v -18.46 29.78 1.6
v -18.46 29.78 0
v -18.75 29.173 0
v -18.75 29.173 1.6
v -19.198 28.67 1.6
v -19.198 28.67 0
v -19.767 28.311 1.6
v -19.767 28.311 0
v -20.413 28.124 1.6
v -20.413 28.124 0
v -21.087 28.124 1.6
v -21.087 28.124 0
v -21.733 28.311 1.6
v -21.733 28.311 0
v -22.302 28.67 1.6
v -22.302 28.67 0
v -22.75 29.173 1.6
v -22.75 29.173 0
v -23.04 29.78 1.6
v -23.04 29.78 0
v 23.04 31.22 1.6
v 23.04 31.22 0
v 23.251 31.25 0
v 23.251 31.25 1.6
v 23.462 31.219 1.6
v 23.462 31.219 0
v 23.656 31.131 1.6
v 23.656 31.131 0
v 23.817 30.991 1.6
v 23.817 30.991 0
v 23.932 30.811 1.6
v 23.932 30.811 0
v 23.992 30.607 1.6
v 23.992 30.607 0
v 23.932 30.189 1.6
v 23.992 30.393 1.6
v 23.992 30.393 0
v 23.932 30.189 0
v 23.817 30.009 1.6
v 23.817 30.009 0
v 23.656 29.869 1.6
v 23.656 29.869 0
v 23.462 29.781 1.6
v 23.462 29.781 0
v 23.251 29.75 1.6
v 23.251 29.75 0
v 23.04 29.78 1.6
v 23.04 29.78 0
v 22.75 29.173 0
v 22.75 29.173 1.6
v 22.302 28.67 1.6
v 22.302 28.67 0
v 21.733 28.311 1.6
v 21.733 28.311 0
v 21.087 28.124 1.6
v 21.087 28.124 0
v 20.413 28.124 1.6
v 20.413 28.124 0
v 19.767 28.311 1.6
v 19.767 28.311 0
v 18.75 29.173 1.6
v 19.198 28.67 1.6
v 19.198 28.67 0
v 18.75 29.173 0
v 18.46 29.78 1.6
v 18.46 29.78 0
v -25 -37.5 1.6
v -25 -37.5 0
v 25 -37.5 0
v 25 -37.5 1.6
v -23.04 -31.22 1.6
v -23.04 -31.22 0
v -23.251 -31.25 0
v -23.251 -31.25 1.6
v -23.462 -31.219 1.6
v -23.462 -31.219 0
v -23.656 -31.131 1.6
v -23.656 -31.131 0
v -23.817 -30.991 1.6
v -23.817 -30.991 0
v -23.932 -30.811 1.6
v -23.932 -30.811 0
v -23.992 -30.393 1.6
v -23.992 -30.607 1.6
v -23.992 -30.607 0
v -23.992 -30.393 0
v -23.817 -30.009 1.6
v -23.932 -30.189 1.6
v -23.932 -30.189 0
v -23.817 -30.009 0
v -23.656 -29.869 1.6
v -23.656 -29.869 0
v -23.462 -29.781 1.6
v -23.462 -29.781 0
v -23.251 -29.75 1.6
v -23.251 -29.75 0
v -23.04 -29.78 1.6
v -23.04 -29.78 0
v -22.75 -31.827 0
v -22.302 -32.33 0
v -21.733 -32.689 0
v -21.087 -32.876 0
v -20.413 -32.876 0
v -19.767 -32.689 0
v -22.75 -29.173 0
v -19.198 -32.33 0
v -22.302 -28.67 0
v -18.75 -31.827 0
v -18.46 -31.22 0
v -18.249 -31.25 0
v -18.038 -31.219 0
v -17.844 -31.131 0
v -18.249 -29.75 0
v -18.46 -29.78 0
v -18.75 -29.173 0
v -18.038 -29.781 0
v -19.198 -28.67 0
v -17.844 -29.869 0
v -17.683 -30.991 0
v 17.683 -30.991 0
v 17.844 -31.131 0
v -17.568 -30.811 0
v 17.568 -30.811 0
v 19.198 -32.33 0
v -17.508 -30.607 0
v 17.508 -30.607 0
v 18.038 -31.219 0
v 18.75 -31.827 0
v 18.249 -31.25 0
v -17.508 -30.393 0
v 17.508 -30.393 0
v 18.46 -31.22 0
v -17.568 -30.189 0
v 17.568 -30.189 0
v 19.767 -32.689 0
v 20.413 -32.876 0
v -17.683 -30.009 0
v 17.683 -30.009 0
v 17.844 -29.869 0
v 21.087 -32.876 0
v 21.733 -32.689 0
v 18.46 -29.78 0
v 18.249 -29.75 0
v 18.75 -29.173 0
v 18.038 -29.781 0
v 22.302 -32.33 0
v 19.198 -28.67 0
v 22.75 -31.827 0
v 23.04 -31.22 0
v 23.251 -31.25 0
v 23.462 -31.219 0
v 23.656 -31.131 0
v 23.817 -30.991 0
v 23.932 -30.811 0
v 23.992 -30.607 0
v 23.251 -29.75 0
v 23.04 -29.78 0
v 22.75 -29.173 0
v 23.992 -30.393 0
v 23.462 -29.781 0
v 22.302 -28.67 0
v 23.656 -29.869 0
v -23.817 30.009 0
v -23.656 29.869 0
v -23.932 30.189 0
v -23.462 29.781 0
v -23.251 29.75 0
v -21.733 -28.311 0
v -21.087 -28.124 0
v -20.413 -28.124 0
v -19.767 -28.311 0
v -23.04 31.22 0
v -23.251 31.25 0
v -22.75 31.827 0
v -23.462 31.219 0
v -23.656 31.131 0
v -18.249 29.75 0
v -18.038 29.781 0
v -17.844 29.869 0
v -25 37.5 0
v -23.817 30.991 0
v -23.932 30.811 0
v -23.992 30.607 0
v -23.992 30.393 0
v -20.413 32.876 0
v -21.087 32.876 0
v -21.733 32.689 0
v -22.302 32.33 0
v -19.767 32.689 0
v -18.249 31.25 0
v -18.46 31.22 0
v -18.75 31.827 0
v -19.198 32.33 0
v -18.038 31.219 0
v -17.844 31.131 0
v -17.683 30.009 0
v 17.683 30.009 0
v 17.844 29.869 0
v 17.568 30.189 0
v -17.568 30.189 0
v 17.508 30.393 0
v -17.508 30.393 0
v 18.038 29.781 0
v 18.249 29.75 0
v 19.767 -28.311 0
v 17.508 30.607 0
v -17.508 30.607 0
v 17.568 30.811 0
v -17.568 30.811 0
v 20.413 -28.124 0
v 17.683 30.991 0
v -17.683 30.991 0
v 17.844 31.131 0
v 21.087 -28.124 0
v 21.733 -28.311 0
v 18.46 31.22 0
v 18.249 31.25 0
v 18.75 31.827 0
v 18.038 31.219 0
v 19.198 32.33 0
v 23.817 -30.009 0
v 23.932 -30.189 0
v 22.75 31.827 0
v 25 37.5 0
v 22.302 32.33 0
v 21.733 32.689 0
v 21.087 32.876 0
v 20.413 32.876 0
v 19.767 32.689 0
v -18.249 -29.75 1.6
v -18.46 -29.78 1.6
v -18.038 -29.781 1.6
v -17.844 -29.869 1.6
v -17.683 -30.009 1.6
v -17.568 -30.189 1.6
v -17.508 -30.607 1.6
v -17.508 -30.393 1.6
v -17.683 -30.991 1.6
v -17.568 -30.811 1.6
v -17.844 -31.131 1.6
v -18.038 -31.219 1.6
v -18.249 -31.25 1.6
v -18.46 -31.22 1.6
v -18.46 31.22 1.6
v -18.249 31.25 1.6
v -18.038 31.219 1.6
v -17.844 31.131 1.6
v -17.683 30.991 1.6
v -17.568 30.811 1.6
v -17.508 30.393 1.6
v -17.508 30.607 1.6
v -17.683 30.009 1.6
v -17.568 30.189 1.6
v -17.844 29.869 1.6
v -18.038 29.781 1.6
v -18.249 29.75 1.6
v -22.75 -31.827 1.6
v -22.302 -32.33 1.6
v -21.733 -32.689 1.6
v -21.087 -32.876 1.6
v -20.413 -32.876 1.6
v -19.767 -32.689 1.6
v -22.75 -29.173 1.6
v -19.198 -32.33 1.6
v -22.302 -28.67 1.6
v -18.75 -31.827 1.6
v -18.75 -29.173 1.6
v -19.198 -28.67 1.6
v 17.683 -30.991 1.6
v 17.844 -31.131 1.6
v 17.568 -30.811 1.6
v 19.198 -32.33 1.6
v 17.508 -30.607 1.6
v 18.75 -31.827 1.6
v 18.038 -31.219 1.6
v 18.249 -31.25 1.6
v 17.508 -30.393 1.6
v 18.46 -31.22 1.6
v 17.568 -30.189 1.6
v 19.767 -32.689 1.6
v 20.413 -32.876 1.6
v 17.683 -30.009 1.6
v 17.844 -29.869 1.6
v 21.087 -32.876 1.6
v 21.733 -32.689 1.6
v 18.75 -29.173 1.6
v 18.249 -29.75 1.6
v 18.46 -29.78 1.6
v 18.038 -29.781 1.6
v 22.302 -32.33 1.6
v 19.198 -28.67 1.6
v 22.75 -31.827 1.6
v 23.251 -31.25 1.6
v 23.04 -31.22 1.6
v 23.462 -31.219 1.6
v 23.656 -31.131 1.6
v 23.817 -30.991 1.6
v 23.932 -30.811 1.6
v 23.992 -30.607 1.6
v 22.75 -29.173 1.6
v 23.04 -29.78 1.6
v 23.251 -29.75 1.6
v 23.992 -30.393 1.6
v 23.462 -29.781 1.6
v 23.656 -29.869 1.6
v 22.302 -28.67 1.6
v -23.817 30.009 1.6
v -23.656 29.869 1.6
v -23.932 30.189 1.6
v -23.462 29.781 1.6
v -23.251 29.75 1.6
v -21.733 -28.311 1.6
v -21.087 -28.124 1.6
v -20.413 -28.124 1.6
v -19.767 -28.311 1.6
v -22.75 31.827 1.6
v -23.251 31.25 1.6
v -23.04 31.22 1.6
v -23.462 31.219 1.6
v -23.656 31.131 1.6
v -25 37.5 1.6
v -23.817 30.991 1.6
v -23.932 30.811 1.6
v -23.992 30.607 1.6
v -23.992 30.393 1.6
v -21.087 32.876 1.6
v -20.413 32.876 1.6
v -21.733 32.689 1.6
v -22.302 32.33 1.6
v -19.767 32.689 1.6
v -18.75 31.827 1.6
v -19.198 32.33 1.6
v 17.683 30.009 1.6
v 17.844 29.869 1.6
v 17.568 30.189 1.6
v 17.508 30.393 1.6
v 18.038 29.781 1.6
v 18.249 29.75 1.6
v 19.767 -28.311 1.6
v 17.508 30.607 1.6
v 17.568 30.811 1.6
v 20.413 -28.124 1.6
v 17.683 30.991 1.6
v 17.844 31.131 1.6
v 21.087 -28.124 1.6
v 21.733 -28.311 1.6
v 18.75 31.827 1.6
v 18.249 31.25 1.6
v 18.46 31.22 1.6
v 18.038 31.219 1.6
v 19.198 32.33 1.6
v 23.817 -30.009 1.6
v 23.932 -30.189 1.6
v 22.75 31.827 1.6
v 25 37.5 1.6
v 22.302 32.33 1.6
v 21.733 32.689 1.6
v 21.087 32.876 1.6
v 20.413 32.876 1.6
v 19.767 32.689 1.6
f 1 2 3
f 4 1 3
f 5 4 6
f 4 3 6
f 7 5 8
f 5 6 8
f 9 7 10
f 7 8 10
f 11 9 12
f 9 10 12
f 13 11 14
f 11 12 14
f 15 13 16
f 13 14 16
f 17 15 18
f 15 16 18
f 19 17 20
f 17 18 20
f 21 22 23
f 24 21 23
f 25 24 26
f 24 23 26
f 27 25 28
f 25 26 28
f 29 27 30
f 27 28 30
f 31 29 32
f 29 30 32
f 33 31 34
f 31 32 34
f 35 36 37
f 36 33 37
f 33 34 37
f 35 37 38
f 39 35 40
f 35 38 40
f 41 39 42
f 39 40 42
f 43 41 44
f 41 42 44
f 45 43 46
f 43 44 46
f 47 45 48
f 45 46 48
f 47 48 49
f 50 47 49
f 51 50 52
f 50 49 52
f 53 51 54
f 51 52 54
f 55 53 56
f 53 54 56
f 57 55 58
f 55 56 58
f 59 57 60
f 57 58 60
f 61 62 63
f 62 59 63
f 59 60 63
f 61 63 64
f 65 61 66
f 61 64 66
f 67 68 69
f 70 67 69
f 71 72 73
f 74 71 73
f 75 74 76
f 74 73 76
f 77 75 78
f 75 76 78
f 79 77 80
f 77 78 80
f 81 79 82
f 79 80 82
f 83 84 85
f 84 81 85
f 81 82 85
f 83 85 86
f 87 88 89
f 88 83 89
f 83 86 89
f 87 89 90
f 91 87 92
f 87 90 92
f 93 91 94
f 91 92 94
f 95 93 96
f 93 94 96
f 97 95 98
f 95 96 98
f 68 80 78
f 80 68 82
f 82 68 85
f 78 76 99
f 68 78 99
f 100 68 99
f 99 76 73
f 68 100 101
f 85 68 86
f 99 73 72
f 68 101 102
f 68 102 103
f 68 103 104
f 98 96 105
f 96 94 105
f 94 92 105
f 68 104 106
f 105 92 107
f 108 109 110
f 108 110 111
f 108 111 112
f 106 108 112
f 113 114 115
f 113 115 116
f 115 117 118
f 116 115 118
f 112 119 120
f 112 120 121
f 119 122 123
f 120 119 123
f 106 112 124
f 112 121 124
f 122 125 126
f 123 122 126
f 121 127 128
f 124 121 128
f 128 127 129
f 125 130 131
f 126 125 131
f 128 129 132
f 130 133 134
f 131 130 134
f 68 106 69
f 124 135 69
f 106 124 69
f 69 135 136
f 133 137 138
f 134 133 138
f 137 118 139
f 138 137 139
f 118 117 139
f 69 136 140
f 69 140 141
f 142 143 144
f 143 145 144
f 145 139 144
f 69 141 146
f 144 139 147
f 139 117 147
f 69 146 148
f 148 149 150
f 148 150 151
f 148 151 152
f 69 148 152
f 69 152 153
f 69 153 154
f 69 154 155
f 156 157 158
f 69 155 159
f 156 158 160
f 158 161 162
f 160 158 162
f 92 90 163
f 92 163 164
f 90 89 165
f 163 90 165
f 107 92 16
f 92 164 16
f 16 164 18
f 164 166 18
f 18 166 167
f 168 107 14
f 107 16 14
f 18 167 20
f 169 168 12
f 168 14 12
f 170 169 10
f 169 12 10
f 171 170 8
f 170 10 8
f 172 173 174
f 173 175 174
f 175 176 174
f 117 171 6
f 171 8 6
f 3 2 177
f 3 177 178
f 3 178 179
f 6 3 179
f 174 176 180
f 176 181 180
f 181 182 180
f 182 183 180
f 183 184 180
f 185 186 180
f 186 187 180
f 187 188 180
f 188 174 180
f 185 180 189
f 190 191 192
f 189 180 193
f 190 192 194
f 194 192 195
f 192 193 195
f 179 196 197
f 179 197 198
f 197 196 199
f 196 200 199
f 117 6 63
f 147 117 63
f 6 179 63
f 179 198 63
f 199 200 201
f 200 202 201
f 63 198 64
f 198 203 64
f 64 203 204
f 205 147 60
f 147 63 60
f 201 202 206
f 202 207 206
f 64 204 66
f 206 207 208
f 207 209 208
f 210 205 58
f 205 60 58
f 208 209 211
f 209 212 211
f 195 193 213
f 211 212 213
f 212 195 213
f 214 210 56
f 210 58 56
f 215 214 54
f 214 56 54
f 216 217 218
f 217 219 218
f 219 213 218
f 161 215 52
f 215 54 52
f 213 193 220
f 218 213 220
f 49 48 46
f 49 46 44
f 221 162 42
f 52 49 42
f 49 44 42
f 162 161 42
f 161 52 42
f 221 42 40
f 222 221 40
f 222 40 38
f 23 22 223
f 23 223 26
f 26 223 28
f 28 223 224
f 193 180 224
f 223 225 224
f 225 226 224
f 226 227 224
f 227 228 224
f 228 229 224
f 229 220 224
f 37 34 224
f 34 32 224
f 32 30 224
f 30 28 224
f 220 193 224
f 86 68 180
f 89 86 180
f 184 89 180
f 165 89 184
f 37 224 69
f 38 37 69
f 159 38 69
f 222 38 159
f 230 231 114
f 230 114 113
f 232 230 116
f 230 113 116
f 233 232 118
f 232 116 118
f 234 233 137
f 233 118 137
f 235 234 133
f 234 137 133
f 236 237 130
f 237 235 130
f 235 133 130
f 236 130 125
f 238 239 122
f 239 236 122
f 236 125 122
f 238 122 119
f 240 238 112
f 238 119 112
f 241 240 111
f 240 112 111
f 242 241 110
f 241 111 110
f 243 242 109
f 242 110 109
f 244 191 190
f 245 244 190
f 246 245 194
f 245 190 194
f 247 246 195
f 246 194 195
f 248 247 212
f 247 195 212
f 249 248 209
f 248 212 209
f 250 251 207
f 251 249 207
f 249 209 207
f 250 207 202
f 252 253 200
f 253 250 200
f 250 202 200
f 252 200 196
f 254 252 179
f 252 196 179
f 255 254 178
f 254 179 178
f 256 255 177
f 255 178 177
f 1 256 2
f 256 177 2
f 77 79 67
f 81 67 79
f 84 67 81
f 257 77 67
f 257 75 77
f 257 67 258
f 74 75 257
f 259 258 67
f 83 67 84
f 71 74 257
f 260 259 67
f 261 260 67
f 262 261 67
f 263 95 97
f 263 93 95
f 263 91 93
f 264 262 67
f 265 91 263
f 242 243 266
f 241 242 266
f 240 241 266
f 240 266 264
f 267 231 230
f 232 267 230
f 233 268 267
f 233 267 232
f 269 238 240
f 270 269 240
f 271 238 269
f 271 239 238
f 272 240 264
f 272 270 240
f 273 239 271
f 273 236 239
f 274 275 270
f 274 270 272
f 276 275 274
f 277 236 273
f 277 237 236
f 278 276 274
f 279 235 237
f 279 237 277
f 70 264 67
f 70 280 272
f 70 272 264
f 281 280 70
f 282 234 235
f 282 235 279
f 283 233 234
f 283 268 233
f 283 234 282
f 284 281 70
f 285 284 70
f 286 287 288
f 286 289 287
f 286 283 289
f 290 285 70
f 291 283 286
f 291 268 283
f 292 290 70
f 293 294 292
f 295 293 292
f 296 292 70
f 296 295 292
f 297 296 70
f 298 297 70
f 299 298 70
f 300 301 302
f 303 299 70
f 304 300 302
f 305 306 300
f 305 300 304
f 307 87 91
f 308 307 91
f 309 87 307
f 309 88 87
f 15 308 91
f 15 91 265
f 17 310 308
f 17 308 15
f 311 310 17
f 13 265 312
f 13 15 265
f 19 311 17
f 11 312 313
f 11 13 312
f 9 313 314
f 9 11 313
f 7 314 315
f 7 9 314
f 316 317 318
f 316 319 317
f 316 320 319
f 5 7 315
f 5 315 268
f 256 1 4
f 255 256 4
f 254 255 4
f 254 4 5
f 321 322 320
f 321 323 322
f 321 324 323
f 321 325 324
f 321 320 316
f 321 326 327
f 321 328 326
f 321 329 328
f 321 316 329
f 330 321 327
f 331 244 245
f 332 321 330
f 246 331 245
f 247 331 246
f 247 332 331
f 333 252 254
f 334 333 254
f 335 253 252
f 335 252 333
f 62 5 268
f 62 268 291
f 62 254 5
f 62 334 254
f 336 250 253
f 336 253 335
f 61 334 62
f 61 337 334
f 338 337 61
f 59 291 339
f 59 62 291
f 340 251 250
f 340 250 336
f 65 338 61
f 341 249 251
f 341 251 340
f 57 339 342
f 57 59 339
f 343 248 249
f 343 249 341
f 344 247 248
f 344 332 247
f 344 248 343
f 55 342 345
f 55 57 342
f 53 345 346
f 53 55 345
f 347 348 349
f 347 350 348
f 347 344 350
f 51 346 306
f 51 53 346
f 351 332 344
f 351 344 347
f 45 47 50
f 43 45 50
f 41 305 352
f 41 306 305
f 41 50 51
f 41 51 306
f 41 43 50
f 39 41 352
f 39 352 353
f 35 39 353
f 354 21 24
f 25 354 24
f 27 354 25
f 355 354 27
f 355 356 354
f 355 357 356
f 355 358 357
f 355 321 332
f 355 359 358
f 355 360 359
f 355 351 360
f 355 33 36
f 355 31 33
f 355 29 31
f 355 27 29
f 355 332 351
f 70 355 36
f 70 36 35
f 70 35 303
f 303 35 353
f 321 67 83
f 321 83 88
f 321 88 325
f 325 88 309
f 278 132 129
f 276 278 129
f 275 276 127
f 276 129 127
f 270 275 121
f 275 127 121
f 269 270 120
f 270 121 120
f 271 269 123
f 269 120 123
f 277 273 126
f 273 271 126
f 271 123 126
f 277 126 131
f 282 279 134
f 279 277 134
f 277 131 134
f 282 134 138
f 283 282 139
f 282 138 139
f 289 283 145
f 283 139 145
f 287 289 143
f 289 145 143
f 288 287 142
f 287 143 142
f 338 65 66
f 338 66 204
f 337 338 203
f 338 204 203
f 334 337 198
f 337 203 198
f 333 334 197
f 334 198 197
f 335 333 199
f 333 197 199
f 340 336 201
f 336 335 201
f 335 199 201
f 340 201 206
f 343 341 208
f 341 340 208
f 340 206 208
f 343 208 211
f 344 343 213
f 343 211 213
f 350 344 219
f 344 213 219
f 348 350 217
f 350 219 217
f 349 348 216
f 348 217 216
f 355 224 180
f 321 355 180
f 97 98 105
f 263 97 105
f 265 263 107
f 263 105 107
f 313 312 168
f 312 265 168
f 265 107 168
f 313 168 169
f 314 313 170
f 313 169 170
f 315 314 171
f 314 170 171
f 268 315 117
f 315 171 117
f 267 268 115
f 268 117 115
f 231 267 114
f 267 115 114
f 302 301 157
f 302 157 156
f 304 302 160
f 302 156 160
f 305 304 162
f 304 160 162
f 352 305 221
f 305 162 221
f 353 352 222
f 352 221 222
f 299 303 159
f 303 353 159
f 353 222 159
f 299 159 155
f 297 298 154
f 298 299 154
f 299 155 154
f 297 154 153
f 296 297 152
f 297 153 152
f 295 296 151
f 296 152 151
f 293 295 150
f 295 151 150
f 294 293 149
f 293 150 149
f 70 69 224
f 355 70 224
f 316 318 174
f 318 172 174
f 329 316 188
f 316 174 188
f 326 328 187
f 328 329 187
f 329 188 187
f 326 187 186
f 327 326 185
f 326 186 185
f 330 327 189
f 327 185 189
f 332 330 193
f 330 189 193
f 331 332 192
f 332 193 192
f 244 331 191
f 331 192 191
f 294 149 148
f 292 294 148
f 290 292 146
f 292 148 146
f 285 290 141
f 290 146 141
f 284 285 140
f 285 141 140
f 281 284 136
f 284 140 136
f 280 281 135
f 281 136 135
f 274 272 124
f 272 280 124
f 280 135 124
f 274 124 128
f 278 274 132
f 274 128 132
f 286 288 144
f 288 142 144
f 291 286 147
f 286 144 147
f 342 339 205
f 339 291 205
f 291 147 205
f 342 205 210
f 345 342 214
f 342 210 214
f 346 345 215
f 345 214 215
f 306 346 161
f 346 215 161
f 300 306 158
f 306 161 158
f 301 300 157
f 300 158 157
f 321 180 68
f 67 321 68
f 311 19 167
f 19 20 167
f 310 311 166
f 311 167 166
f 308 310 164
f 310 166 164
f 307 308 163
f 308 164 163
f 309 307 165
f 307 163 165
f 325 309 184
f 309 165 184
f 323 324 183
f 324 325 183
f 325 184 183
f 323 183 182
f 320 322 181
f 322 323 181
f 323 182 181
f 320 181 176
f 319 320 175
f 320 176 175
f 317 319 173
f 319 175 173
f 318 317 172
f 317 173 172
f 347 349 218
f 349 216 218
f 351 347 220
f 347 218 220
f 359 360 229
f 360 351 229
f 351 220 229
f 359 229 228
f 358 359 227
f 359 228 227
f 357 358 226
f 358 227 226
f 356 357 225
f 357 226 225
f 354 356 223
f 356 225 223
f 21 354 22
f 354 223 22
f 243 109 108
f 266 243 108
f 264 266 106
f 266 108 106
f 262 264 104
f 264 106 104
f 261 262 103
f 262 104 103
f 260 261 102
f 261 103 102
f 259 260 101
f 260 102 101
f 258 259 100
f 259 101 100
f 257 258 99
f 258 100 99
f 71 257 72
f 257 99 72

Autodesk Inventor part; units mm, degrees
ref_plane "YZ Plane" through (0, 0, 0) normal (1, 0, 0) x (0, 1, 0)
ref_plane "XZ Plane" through (0, 0, 0) normal (0, 1, 0) x (-1, 0, 0)
ref_plane "XY Plane" through (0, 0, 0) normal (0, 0, 1) x (1, 0, 0)
sketch "Sketch1" plane through (0, 0, 0) normal (0, 0, 1) x (1, 0, 0)
  line L0 (25, 37.5) -> (-25, 37.5)
  line L1 (-25, 37.5) -> (-25, -37.5)
  line L2 (-25, -37.5) -> (25, -37.5)
  line L3 (25, -37.5) -> (25, 37.5)
  line L4 (25, 37.5) -> (-25, -37.5) construction
  line L5 (-25, 37.5) -> (25, -37.5) construction
  line L6 (-20.75, -30.5) -> (20.75, -30.5) construction
  line L7 (20.75, -30.5) -> (20.75, 30.5) construction
  line L8 (20.75, 30.5) -> (-20.75, 30.5) construction
  line L9 (-20.75, 30.5) -> (-20.75, -30.5) construction
  line L10 (-20.75, -30.5) -> (20.75, 30.5) construction
  line L11 (20.75, -30.5) -> (-20.75, 30.5) construction
  circle A0 centre (20.75, 30.5) radius 2.4
  arc A1 (23.0395, 29.7801) -> (23.0395, 31.2199) centre (23.25, 30.5) ccw
  line L12 (0, 37.5) -> (0, -37.5) construction
  line L13 (25, 0) -> (-25, 0) construction
  circle A2 centre (20.75, -30.5) radius 2.4
  arc A3 (23.0395, -31.2199) -> (23.0395, -29.7801) centre (23.25, -30.5) ccw
  line L14 (0, -37.5) -> (0, 37.5) construction
  circle A4 centre (-20.75, 30.5) radius 2.4
  arc A5 (-23.0395, 31.2199) -> (-23.0395, 29.7801) centre (-23.25, 30.5) ccw
  circle A6 centre (-20.75, -30.5) radius 2.4
  arc A7 (-23.0395, -29.7801) -> (-23.0395, -31.2199) centre (-23.25, -30.5) ccw
  arc A8 (18.4605, 31.2199) -> (18.4605, 29.7801) centre (18.25, 30.5) ccw
  arc A9 (18.4605, -29.7801) -> (18.4605, -31.2199) centre (18.25, -30.5) ccw
  arc A10 (-18.4605, 29.7801) -> (-18.4605, 31.2199) centre (-18.25, 30.5) ccw
  arc A11 (-18.4605, -31.2199) -> (-18.4605, -29.7801) centre (-18.25, -30.5) ccw
  point P0 (0, 0)
  point P1 (24, 30.5)
  point P2 (17.5, 30.5)
  point P3 (18.4605, 29.7801)
  point P4 (18.4605, 31.2199)
  point P5 (18.4605, -31.2199)
  point P6 (18.4605, -29.7801)
  point P7 (-18.4605, -29.7801)
  point P8 (-18.4605, -31.2199)
  point P9 (-18.4605, 31.2199)
  point P10 (-18.4605, 29.7801)
  dimension "d0" = 50
  dimension "d1" = 75
  dimension "d2" = 4.8
  dimension "d4" = 1.5
  dimension "d6" = 14
  dimension "d9" = 61
  dimension "d10" = 41.5
  dimension "d11" = 6.5
  dimension "d12" = 1
extrude "Extrusion1" add sketch "Sketch1" along normal blind 1.6
properties part number "SUSTAINA-POWER-INPUT-BORAD" material "CFRP"
